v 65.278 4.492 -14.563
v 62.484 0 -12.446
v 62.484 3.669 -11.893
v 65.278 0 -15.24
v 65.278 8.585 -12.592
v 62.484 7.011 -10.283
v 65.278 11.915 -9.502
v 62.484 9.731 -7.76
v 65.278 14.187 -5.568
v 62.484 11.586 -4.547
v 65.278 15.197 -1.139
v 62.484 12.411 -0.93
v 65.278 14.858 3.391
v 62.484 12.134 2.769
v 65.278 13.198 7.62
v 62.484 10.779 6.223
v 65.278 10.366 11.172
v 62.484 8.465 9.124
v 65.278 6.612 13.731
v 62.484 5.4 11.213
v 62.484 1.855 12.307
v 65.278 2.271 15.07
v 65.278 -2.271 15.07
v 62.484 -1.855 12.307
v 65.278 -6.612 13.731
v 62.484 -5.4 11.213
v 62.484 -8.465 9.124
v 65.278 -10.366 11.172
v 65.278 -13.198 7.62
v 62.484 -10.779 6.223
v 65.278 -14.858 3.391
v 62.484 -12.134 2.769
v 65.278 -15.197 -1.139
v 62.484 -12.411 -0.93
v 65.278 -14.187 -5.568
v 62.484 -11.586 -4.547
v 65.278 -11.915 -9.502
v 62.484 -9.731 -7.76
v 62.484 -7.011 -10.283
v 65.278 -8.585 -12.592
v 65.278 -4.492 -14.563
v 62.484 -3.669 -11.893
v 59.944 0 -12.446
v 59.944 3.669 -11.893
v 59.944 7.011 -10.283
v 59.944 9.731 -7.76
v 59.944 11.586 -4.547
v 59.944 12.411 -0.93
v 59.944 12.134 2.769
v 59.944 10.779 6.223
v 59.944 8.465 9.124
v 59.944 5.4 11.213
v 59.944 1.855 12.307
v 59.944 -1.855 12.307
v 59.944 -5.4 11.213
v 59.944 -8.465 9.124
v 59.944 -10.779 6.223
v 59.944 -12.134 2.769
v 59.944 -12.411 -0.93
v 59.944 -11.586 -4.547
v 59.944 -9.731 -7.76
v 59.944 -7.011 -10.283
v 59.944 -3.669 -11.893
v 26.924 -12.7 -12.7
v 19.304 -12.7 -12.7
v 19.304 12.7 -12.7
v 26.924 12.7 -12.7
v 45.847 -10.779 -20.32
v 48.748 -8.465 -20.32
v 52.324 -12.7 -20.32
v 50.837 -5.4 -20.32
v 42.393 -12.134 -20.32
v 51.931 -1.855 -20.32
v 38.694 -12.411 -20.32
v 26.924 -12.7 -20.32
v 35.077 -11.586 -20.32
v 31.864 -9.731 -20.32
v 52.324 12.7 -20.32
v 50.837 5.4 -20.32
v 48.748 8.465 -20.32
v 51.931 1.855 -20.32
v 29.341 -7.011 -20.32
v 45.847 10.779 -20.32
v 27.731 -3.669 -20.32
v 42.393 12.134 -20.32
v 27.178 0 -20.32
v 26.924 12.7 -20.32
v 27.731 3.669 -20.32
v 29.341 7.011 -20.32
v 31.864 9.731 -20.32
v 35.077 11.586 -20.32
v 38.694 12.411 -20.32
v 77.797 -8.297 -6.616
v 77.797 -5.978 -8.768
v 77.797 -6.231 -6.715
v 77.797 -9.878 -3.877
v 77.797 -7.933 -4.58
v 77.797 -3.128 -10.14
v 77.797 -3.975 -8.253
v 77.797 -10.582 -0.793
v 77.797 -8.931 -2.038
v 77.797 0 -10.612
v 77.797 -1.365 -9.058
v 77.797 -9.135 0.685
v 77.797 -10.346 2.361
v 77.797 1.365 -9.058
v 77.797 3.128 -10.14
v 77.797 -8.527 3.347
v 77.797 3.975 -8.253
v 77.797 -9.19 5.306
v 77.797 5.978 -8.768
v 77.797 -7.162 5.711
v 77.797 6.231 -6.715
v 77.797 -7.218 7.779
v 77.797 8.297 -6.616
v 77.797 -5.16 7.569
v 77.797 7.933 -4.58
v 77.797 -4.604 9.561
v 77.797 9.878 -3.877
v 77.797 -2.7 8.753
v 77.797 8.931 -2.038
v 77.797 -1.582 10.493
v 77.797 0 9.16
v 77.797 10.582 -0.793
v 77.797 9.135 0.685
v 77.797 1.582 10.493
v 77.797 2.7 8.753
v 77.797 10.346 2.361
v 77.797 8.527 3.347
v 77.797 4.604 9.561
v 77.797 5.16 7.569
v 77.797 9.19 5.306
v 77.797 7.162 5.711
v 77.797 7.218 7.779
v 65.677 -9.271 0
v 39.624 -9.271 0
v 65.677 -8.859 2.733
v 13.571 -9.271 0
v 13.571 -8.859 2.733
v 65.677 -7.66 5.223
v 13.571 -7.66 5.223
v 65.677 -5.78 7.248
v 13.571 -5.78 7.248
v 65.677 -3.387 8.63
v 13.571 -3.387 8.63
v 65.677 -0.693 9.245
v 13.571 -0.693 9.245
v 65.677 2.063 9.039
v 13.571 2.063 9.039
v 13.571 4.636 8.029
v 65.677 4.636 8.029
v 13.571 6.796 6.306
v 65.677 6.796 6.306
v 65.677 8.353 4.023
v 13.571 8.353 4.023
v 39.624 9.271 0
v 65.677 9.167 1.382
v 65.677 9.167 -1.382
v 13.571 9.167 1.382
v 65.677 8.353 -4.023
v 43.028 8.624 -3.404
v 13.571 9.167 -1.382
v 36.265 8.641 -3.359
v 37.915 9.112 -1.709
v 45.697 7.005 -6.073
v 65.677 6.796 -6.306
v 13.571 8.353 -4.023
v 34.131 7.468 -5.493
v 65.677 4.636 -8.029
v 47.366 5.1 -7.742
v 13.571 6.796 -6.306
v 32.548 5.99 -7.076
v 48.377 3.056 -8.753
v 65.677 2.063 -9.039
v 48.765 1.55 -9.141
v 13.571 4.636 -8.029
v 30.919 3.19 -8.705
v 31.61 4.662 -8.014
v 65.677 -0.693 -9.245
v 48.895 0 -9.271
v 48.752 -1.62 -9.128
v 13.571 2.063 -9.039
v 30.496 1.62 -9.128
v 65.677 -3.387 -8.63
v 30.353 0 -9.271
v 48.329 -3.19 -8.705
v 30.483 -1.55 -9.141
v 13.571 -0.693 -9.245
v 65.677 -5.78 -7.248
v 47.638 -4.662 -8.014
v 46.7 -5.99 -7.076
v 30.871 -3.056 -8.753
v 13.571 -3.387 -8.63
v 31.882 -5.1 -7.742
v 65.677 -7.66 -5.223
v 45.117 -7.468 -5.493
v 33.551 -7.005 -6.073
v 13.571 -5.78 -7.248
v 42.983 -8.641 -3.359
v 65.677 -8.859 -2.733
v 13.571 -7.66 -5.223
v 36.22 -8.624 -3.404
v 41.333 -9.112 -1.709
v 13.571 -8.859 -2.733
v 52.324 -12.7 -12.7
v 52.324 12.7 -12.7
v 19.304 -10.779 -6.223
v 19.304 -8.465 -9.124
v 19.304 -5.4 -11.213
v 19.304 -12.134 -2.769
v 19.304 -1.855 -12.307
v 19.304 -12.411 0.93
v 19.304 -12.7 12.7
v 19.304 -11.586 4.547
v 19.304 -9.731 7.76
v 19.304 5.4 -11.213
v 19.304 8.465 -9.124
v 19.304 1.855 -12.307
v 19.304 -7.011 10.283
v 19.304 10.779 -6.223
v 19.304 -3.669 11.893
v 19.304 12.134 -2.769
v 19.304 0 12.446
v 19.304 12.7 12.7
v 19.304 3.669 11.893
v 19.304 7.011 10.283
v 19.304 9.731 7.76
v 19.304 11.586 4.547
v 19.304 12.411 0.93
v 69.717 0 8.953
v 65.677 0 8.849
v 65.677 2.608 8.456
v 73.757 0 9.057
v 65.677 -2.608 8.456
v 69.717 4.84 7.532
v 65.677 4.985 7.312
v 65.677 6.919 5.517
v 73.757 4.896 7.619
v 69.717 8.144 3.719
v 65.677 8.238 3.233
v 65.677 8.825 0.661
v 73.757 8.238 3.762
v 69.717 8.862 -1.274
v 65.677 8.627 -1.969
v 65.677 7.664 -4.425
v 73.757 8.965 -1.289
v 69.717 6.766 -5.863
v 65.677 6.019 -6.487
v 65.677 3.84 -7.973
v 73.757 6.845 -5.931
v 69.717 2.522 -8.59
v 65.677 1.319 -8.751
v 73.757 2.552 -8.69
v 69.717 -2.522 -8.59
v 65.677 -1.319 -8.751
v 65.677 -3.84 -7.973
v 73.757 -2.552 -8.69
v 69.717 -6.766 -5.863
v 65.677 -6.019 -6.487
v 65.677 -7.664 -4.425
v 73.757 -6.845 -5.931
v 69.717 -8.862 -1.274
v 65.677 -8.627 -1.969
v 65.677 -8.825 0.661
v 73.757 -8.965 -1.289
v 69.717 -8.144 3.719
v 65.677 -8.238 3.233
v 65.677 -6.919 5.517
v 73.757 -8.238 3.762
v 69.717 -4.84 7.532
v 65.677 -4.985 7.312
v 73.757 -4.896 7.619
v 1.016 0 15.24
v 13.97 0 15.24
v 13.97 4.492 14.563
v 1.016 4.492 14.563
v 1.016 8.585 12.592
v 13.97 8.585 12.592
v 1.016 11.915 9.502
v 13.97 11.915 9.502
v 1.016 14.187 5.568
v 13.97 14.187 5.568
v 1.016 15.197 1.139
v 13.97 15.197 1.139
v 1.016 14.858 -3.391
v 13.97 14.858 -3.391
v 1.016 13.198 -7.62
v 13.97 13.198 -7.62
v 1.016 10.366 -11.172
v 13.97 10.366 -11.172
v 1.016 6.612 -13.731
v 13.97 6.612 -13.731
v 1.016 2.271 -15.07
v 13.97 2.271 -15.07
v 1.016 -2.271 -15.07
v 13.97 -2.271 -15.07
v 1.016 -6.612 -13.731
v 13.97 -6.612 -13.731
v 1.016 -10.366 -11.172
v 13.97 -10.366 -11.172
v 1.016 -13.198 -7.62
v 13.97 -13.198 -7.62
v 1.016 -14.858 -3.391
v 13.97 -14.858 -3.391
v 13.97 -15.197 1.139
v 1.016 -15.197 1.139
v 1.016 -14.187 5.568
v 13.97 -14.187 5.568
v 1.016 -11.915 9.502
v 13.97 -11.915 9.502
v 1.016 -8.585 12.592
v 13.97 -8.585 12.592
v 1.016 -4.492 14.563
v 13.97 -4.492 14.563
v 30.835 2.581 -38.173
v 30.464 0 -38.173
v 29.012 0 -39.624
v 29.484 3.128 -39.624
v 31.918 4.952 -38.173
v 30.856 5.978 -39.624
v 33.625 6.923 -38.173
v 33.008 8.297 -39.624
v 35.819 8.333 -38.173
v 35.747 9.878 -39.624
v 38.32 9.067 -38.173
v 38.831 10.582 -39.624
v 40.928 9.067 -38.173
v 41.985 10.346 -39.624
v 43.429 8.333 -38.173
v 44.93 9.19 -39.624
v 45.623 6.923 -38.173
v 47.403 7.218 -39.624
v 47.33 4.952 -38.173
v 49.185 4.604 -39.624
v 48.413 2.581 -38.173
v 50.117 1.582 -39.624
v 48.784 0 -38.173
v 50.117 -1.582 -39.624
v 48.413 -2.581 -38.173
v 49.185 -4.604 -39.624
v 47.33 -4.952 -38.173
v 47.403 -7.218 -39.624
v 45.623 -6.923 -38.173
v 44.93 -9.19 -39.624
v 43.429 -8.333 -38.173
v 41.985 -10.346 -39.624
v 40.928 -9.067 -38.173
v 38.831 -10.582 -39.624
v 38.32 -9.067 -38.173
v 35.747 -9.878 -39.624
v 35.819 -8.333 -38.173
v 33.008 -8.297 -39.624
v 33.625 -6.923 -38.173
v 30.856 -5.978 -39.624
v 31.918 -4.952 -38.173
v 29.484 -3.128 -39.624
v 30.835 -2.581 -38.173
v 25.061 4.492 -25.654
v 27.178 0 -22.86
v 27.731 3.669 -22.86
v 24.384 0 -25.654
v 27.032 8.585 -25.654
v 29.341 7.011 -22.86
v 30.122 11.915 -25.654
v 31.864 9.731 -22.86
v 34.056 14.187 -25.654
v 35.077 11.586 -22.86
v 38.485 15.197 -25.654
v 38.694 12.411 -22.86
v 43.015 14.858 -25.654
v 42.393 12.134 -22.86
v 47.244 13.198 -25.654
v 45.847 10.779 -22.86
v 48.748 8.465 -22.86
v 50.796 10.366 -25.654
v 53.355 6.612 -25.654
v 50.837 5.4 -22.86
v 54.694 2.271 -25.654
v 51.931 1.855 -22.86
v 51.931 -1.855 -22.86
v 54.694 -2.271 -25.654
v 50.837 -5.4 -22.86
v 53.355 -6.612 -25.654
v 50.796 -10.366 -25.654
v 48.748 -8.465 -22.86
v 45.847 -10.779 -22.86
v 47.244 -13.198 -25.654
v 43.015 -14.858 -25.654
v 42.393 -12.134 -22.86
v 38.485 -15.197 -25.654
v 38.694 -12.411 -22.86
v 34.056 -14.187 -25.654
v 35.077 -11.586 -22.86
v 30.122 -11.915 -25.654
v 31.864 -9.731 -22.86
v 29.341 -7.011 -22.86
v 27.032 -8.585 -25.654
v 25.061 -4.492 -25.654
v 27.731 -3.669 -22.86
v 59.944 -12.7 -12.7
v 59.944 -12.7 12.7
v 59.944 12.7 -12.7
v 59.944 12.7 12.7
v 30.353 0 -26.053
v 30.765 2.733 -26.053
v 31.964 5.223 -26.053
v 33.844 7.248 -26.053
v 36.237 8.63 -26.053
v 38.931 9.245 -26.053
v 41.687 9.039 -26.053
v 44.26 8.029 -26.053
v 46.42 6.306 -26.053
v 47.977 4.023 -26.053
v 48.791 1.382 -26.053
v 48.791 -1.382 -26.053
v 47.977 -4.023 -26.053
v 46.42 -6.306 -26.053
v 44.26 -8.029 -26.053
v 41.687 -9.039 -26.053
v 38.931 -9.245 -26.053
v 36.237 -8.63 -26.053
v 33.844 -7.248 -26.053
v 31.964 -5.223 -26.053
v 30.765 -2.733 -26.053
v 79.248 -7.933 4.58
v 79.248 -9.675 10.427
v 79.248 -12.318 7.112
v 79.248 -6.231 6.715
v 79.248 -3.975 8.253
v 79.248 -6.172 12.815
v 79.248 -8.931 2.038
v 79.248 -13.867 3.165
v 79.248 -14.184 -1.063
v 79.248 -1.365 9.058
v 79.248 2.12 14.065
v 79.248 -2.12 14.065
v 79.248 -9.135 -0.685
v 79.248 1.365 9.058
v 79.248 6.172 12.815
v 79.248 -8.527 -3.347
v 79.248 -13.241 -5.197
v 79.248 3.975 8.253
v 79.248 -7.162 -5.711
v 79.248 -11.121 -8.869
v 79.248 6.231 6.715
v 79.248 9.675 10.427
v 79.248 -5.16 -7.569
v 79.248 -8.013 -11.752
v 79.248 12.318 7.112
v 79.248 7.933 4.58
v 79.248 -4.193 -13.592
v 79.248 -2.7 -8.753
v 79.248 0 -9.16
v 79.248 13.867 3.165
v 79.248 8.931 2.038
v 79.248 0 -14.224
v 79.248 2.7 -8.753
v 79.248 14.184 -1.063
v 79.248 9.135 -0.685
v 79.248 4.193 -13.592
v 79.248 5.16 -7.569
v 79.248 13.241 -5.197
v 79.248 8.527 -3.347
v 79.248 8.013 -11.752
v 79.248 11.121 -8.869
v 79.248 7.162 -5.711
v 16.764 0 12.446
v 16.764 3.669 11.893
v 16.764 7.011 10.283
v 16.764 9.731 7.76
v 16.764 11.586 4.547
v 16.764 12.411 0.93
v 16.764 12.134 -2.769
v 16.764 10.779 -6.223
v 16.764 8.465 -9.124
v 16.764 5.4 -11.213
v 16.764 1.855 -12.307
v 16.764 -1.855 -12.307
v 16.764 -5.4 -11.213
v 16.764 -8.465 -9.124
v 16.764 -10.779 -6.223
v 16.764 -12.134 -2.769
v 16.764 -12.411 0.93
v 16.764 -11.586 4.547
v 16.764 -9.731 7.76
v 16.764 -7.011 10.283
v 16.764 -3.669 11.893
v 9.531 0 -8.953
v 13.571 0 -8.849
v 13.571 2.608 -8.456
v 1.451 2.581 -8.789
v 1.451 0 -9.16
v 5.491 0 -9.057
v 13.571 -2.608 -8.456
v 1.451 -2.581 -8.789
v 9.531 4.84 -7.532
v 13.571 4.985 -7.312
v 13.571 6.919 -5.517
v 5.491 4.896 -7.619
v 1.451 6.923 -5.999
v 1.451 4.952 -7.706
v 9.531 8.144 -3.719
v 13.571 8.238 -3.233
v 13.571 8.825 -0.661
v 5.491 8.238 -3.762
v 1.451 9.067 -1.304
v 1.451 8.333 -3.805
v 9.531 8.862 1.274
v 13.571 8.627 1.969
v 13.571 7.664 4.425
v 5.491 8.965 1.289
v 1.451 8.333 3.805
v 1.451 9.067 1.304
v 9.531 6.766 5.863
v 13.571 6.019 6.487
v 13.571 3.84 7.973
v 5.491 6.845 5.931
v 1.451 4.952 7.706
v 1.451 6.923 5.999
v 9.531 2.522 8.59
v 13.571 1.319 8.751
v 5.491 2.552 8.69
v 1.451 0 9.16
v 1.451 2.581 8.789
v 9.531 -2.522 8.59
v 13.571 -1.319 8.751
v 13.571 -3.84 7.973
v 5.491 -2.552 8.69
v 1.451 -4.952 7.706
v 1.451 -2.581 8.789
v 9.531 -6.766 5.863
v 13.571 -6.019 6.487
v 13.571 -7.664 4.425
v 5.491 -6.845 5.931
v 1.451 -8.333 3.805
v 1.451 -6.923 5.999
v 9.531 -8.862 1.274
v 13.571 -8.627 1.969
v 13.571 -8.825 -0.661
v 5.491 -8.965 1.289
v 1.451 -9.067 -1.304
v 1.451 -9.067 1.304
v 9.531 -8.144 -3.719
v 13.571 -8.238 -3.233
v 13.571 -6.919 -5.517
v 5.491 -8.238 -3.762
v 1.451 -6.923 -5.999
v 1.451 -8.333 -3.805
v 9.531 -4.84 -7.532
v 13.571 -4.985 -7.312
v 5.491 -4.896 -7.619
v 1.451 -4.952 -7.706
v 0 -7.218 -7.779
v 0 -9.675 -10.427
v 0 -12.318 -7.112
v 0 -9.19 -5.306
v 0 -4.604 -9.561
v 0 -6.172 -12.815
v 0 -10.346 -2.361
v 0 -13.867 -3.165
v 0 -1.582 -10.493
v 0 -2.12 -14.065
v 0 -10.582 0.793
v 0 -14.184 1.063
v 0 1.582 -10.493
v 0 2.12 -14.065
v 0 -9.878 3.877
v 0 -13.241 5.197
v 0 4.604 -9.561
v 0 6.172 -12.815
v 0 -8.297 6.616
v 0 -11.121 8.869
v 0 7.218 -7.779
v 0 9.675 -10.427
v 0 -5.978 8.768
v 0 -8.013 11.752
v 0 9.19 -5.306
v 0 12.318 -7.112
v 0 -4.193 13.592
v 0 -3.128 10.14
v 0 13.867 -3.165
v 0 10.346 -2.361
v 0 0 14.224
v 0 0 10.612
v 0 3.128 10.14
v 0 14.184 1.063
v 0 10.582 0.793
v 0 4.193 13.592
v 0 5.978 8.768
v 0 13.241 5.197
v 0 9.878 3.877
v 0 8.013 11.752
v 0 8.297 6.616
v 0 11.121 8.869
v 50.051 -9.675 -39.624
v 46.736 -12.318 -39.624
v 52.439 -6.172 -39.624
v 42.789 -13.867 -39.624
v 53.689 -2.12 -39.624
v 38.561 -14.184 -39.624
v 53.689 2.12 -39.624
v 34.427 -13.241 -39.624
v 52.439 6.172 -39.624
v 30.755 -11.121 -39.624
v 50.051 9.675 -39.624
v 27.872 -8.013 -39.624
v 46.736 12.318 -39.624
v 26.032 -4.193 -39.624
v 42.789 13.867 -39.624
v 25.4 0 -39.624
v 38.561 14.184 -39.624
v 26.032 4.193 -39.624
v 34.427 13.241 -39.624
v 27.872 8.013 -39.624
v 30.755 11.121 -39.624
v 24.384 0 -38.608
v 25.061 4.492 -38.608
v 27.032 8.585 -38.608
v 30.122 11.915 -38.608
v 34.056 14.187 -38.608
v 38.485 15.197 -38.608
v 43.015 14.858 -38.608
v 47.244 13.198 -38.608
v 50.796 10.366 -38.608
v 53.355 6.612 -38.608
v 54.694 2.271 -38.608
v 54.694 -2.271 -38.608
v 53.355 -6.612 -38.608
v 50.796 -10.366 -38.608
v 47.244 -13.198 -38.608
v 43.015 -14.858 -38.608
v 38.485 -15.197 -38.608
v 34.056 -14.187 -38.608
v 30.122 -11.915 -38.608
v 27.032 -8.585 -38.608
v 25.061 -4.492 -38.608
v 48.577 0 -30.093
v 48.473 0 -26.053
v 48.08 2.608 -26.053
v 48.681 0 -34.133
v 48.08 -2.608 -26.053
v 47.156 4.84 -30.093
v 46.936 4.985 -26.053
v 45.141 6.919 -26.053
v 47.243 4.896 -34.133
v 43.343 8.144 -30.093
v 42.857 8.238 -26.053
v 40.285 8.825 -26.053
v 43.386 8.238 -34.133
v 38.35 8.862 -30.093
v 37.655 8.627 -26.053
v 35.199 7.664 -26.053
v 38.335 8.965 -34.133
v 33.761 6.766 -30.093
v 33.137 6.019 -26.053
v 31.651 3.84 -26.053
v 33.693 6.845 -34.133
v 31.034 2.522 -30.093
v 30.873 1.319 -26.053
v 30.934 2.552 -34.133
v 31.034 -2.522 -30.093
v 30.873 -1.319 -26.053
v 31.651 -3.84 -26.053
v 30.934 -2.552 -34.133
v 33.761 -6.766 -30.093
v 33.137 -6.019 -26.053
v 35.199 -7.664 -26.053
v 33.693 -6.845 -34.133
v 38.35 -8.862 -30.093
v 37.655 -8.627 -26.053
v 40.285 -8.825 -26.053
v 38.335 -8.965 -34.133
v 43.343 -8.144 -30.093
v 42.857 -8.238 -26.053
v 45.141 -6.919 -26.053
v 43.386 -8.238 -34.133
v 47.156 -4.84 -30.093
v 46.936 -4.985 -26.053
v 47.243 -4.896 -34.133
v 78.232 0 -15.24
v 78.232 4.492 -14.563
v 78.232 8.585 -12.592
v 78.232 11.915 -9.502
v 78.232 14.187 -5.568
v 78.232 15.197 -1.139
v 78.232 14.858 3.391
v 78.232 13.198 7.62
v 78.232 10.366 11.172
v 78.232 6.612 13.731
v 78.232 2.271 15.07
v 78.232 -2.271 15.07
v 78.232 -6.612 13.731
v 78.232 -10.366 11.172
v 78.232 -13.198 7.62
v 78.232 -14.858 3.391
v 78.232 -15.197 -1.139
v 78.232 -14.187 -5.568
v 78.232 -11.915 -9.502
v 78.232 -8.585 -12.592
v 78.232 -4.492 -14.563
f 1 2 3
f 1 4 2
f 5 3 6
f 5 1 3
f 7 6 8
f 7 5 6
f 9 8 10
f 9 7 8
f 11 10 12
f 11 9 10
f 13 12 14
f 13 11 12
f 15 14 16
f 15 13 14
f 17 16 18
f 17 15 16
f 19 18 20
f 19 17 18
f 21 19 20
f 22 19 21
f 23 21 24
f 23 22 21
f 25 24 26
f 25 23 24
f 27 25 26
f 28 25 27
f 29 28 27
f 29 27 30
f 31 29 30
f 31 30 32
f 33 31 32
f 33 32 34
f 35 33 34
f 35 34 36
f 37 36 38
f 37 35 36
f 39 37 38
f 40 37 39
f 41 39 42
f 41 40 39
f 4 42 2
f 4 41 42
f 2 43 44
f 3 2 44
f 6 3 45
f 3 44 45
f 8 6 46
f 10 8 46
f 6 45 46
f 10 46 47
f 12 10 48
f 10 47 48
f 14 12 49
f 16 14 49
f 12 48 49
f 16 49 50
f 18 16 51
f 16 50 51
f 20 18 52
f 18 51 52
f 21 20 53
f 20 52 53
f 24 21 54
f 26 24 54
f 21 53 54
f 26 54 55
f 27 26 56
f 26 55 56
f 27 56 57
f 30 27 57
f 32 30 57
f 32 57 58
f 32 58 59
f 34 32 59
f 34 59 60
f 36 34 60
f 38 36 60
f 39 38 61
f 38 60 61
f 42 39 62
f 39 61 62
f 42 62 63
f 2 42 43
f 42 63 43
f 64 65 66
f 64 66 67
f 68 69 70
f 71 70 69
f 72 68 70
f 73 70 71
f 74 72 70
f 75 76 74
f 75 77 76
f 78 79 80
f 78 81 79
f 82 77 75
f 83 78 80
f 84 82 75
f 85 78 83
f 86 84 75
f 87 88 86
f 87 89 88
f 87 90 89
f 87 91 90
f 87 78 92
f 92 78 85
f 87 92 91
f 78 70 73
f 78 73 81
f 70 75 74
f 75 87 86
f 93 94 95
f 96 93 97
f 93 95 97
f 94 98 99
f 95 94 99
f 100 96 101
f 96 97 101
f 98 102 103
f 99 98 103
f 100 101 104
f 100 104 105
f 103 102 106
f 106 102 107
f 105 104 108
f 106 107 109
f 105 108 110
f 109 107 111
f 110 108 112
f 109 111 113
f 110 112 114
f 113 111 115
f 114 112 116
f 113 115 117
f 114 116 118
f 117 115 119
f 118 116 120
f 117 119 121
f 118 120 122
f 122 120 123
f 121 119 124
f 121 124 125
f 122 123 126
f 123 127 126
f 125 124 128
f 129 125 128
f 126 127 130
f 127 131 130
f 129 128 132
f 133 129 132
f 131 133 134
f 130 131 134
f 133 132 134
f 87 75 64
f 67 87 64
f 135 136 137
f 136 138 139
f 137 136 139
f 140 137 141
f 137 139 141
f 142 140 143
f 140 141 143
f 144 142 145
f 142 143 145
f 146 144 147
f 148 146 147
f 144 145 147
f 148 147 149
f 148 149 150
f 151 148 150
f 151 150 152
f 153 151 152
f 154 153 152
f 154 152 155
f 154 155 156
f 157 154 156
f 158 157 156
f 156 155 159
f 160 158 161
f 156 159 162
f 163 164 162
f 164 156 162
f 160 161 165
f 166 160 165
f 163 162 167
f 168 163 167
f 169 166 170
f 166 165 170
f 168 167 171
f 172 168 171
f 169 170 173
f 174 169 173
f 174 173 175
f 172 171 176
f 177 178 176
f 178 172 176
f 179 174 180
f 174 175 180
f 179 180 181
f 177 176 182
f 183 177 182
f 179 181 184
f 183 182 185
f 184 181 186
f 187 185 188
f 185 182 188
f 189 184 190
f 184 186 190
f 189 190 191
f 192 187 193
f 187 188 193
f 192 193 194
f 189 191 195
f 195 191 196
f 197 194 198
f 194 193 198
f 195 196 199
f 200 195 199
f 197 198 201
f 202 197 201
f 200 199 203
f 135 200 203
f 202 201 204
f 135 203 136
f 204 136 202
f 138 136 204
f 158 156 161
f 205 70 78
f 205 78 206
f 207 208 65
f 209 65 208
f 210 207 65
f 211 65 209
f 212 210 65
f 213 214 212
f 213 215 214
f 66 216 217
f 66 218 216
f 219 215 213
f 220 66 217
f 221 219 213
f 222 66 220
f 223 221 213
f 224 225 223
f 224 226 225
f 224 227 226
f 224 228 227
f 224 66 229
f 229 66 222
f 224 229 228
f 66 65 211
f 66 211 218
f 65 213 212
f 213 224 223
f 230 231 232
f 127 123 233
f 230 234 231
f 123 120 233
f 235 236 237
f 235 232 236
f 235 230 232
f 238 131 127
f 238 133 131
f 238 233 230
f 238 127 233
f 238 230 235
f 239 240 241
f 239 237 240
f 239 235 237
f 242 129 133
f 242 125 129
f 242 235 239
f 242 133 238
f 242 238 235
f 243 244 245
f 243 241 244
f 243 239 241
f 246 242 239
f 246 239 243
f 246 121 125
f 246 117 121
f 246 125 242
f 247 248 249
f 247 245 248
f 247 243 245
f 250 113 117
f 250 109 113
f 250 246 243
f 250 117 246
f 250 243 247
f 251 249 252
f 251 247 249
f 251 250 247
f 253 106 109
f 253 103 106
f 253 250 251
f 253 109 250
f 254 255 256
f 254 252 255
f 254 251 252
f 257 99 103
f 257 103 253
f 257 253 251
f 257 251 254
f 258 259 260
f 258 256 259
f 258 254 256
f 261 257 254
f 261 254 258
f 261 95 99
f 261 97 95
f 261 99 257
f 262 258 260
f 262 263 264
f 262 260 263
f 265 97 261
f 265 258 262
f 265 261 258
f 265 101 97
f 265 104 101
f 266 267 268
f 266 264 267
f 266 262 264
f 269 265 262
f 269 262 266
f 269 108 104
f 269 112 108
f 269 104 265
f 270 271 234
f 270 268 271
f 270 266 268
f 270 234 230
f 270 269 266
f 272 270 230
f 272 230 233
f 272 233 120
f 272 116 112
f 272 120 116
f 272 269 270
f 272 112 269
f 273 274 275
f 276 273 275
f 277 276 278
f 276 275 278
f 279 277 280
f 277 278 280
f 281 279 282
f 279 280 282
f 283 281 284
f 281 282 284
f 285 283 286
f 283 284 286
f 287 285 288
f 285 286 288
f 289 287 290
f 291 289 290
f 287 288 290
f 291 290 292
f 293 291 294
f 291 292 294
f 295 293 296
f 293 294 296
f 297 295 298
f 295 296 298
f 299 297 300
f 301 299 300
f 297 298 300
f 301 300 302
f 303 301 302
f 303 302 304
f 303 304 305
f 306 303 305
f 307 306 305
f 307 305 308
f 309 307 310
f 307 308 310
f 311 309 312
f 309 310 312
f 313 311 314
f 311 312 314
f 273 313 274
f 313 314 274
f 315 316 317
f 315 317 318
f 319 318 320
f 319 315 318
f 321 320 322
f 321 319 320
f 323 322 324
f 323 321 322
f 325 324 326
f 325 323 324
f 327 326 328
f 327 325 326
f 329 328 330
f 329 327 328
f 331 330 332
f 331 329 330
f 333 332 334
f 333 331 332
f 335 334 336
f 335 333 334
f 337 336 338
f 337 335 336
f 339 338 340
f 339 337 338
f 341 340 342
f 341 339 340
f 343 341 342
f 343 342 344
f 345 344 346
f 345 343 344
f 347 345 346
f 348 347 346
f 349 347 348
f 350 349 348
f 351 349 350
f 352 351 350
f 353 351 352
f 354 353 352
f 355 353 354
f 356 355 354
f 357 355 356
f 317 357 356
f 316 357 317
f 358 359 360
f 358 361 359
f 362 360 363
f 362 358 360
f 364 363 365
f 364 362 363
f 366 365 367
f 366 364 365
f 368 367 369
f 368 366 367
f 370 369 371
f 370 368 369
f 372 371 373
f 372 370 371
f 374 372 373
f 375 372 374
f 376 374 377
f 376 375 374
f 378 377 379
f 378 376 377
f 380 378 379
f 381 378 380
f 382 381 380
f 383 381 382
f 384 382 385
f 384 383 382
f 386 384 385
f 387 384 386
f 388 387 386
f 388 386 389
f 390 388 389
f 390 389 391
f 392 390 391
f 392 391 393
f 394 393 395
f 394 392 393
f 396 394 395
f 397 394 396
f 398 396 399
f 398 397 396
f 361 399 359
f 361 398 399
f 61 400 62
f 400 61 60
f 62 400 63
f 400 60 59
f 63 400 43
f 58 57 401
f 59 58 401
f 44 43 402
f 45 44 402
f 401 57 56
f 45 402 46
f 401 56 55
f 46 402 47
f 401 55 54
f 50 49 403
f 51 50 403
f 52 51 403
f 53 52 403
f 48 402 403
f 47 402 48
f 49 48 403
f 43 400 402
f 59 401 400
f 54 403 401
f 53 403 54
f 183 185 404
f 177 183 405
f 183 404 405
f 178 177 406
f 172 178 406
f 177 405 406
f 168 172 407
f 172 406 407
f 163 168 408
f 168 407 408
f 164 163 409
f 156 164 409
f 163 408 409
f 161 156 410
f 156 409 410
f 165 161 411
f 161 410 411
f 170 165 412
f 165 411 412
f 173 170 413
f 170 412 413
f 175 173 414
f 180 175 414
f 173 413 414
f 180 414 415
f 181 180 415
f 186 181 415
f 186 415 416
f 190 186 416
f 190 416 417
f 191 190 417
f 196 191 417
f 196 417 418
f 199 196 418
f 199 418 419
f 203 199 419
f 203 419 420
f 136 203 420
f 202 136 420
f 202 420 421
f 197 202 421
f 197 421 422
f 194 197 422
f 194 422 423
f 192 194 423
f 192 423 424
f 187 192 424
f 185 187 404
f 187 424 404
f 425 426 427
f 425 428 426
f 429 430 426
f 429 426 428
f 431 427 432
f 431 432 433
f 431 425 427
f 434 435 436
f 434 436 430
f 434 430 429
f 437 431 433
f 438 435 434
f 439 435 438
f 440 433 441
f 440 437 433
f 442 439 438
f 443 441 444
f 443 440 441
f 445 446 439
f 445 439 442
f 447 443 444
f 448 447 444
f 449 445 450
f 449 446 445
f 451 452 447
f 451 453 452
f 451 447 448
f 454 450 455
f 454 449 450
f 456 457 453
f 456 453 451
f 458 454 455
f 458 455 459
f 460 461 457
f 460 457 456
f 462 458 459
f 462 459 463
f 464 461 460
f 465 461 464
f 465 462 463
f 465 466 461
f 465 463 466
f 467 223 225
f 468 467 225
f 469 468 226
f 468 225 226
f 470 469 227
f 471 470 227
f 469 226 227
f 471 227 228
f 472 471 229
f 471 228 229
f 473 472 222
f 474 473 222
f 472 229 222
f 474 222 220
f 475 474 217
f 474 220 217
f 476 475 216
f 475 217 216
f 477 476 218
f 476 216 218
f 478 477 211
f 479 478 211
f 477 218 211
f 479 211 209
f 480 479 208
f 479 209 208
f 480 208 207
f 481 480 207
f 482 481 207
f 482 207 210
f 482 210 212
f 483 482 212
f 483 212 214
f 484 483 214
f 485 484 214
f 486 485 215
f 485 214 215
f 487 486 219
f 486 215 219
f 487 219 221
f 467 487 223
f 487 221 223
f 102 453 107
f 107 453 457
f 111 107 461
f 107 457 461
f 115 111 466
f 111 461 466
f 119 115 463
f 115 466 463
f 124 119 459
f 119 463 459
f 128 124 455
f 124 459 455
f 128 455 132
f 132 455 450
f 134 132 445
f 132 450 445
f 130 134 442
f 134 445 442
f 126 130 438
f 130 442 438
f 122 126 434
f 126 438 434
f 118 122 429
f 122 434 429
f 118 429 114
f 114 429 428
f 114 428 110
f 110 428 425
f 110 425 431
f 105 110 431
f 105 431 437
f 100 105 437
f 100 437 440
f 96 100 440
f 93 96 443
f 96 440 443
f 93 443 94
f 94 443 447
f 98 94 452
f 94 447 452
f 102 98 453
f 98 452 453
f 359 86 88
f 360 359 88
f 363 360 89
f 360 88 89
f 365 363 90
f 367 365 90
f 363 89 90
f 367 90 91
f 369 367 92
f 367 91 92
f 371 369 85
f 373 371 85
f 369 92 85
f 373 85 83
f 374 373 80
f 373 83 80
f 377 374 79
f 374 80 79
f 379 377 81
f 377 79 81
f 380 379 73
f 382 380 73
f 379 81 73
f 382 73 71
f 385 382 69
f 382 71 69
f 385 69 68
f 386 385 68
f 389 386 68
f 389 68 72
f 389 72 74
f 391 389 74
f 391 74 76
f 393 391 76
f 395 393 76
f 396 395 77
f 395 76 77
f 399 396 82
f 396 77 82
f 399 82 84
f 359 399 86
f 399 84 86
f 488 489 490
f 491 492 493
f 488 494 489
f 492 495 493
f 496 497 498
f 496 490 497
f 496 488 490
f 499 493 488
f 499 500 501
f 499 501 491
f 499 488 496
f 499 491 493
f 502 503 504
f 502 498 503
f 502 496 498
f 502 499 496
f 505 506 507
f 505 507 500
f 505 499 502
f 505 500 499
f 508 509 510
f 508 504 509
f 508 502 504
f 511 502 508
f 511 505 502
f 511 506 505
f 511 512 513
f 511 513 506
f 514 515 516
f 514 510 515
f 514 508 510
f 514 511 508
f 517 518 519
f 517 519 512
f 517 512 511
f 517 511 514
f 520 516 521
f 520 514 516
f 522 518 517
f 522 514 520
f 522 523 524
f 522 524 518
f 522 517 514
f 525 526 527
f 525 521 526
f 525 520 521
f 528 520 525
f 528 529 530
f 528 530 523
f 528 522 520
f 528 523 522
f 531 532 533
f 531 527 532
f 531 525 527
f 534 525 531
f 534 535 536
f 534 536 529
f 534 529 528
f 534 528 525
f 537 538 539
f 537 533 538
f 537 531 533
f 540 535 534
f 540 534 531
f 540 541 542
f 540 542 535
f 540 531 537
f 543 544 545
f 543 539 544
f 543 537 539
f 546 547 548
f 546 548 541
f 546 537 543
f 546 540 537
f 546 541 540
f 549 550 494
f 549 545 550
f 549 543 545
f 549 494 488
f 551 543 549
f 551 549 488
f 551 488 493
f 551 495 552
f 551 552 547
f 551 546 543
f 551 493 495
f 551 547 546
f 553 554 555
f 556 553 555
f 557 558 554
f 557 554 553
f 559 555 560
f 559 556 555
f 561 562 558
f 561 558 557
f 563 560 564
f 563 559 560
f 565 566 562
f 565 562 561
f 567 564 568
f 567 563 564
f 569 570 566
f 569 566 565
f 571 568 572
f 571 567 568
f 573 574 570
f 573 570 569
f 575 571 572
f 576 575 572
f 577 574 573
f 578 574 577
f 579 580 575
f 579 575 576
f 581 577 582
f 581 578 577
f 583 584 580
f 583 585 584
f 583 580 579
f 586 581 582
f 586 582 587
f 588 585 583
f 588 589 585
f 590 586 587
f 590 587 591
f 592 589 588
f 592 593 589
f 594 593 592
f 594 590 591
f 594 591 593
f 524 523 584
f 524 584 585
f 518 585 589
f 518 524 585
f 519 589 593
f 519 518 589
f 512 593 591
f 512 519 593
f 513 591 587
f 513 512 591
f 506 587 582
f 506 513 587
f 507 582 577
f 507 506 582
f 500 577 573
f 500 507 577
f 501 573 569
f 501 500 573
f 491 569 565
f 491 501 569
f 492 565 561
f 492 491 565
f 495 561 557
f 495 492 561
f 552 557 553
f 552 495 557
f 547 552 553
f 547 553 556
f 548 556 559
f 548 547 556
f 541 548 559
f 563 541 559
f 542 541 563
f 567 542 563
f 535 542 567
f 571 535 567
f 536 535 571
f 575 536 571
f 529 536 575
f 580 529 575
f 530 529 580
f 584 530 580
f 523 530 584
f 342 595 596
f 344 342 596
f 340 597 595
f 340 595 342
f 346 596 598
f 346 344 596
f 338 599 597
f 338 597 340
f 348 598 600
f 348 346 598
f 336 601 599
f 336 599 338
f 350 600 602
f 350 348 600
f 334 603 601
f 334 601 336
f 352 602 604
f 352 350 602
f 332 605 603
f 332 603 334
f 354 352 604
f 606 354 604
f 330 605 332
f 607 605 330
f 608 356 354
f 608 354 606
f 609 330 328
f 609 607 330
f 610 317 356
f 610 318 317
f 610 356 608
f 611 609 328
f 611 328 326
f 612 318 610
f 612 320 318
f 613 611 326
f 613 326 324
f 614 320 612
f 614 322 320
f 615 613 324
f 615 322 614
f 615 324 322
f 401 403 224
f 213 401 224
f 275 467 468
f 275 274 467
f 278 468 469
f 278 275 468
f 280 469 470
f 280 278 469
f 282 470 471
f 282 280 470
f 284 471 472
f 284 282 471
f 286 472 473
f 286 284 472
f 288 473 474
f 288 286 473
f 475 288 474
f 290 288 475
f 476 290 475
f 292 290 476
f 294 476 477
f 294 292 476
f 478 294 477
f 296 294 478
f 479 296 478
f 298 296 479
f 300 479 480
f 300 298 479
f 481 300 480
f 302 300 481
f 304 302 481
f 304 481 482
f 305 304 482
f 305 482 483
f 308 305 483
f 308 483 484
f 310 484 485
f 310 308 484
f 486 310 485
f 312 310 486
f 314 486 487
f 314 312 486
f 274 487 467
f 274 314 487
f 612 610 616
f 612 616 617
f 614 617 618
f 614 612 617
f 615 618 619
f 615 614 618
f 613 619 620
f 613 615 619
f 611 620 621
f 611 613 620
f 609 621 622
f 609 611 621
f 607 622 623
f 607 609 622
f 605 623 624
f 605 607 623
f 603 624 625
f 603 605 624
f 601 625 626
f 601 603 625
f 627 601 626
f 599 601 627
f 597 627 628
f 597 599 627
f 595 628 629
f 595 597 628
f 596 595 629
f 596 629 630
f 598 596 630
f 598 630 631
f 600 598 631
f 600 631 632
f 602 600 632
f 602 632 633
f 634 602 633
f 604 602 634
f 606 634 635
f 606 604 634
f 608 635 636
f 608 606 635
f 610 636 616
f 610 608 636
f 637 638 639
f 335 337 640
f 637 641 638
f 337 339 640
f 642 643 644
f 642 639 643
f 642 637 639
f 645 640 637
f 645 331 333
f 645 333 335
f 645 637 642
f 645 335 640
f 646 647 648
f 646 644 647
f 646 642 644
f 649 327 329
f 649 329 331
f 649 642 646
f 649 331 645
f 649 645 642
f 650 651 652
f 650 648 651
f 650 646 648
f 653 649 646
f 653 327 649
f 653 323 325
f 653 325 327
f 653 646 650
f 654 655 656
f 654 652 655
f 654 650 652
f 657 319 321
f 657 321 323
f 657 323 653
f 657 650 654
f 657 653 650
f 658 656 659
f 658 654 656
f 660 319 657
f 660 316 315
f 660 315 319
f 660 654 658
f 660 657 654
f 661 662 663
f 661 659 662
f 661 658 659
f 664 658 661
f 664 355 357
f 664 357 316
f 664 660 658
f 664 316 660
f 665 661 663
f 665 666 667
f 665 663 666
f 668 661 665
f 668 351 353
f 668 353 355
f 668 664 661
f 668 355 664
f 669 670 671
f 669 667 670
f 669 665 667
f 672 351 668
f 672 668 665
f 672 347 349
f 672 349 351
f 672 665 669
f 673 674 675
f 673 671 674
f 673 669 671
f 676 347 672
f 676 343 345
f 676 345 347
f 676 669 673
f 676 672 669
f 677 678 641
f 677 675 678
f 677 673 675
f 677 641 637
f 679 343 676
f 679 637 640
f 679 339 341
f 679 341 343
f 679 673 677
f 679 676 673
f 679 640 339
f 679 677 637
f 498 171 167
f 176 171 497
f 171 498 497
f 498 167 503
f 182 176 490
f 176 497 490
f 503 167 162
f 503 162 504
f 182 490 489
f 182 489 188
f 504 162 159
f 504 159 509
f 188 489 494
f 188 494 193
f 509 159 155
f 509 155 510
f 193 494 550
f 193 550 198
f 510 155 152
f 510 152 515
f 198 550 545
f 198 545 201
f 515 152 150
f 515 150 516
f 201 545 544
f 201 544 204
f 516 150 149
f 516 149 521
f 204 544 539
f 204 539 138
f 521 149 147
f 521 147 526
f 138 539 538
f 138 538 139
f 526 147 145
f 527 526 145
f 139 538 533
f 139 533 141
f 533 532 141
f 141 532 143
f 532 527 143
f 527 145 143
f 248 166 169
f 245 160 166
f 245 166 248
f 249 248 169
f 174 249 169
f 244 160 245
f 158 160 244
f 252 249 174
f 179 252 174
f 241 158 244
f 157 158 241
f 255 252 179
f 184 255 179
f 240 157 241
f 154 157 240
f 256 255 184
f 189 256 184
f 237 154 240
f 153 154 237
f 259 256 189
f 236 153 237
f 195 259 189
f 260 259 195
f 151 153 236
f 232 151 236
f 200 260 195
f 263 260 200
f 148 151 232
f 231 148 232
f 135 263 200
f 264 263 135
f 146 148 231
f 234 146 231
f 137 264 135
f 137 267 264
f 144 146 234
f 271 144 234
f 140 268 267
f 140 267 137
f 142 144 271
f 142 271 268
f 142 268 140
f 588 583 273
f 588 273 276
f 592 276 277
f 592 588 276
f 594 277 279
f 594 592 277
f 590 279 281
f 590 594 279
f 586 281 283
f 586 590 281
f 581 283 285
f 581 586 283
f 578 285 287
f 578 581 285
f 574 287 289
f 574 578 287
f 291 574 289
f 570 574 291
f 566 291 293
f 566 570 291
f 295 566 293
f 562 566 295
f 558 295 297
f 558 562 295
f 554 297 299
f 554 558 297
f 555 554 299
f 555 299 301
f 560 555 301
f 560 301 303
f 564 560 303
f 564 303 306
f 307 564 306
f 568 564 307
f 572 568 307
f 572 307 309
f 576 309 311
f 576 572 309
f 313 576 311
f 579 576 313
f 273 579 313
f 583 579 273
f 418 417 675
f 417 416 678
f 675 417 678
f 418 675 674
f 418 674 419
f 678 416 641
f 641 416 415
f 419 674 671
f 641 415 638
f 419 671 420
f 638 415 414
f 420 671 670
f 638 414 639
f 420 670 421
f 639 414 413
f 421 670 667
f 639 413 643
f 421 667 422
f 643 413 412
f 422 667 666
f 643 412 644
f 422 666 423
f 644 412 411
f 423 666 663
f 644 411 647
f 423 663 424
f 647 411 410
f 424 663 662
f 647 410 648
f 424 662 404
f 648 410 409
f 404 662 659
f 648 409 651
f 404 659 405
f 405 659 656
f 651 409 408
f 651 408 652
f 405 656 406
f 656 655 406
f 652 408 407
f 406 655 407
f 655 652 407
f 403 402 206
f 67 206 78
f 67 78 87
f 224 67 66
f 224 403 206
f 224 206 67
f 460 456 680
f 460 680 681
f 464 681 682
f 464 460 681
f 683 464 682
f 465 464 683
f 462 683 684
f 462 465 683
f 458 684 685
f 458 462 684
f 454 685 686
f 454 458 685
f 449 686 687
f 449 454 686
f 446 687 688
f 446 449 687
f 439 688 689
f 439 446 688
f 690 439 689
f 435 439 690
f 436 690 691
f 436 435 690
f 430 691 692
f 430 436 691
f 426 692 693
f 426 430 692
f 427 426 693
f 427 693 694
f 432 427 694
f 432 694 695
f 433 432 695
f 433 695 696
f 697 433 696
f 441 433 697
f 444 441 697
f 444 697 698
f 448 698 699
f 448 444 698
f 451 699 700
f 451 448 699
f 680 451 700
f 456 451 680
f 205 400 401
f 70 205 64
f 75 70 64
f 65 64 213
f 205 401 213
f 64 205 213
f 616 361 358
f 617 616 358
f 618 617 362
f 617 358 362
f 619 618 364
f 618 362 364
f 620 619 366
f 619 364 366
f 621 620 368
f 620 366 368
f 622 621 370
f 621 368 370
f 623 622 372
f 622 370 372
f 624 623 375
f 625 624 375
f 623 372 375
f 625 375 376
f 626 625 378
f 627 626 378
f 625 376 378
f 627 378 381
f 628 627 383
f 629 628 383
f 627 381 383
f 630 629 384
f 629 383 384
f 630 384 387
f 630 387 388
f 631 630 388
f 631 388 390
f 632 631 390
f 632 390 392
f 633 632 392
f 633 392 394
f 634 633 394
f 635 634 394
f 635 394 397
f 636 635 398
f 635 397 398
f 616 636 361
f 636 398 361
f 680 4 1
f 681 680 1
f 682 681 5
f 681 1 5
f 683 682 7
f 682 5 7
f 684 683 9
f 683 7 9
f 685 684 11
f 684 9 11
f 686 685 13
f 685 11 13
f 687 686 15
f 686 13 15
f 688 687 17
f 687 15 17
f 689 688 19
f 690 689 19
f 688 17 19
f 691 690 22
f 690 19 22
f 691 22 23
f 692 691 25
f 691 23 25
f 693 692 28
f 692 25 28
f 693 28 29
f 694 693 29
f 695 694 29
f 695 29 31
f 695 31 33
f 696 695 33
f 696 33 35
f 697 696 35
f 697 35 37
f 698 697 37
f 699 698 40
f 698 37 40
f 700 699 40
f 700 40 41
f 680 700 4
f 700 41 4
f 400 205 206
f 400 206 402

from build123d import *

# Parameters (mm, degrees)
SKETCH1_W            = 40.64
SKETCH1_H            = 33.02
BOSS_EXTRUDE1_DEPTH  = 25.4
SKETCH2_W            = 7.62
SKETCH2_H            = 7.62
CUT_EXTRUDE1_DEPTH   = 26.4
SKETCH3_W            = 7.62
SKETCH3_H            = 7.62
CUT_EXTRUDE2_DEPTH   = 26.4
SKETCH4_R            = 12.446
BOSS_EXTRUDE2_DEPTH  = 2.54
SKETCH5_R            = 12.446
BOSS_EXTRUDE3_DEPTH  = 2.794
BOSS_EXTRUDE3_TAPER  = -45
SKETCH6_R            = 15.24
BOSS_EXTRUDE4_DEPTH  = 13.97
SKETCH7_R            = 12.446
BOSS_EXTRUDE5_DEPTH  = 2.54
SKETCH8_R            = 12.446
BOSS_EXTRUDE6_DEPTH  = 2.794
BOSS_EXTRUDE6_TAPER  = -45
SKETCH9_R            = 15.24
BOSS_EXTRUDE7_DEPTH  = 13.97
SKETCH10_R           = 12.446
BOSS_EXTRUDE8_DEPTH  = 2.54
SKETCH11_R           = 12.446
BOSS_EXTRUDE9_DEPTH  = 2.794
BOSS_EXTRUDE9_TAPER  = -45
SKETCH12_R           = 15.24
BOSS_EXTRUDE10_DEPTH = 13.97
SKETCH13_R           = 9.271
CUT_EXTRUDE3_DEPTH   = 52.10556
CUT_EXTRUDE4_REACH   = 43.293
SKETCH14_R           = 9.271
SKETCH15_R           = 10.611739
CUT_EXTRUDE5_DEPTH   = 1.451356
CUT_EXTRUDE5_TAPER   = 45
SKETCH16_R           = 8.849363403
CUT_EXTRUDE6_DEPTH   = 12.119864
CUT_EXTRUDE6_TAPER   = -1.47
SKETCH17_R           = 10.611739
CUT_EXTRUDE7_DEPTH   = 1.451356
CUT_EXTRUDE7_TAPER   = 45
SKETCH18_R           = 8.849363403
CUT_EXTRUDE8_DEPTH   = 12.119864
CUT_EXTRUDE8_TAPER   = -1.47
SKETCH21_R           = 8.849363403
CUT_EXTRUDE9_DEPTH   = 12.119864
CUT_EXTRUDE9_TAPER   = -1.47
CHAMFER1_SIZE        = 1.016
CHAMFER2_SIZE        = 1.016
CHAMFER3_SIZE        = 1.016


with BuildPart() as part:
    # Sketch1 → Boss-Extrude1 (new body)
    with BuildSketch(Plane(origin=(0, 12.7, 0), x_dir=(-1, 0, 0), z_dir=(0, 1, 0))):
        with Locations((-39.624, -3.81)):
            Rectangle(SKETCH1_W, SKETCH1_H)
    extrude(amount=-BOSS_EXTRUDE1_DEPTH)

    # Sketch2 → Cut-Extrude1 (cut, through all)
    with BuildSketch(Plane.XZ.offset(12.7)):
        with Locations((56.134, -16.51)):
            Rectangle(SKETCH2_W, SKETCH2_H)
    extrude(amount=-CUT_EXTRUDE1_DEPTH, mode=Mode.SUBTRACT)

    # Sketch3 → Cut-Extrude2 (cut, through all)
    with BuildSketch(Plane.XZ.offset(12.7)):
        with Locations((23.114, -16.51)):
            Rectangle(SKETCH3_W, SKETCH3_H)
    extrude(amount=-CUT_EXTRUDE2_DEPTH, mode=Mode.SUBTRACT)

    # Sketch4 → Boss-Extrude2 (add)
    with BuildSketch(Plane.ZY.offset(-19.304)):
        Circle(SKETCH4_R)
    extrude(amount=BOSS_EXTRUDE2_DEPTH)

    # Sketch5 → Boss-Extrude3 (add)
    with BuildSketch(Plane.ZY.offset(-16.764)):
        Circle(SKETCH5_R)
    extrude(amount=BOSS_EXTRUDE3_DEPTH, taper=BOSS_EXTRUDE3_TAPER)

    # Sketch6 → Boss-Extrude4 (add)
    with BuildSketch(Plane.ZY.offset(-13.97)):
        Circle(SKETCH6_R)
    extrude(amount=BOSS_EXTRUDE4_DEPTH)

    # Sketch7 → Boss-Extrude5 (add)
    with BuildSketch(Plane(origin=(59.944, 0, 0), x_dir=(0, 0, -1), z_dir=(1, 0, 0))):
        Circle(SKETCH7_R)
    extrude(amount=BOSS_EXTRUDE5_DEPTH)

    # Sketch8 → Boss-Extrude6 (add)
    with BuildSketch(Plane(origin=(62.484, 0, 0), x_dir=(0, 0, -1), z_dir=(1, 0, 0))):
        Circle(SKETCH8_R)
    extrude(amount=BOSS_EXTRUDE6_DEPTH, taper=BOSS_EXTRUDE6_TAPER)

    # Sketch9 → Boss-Extrude7 (add)
    with BuildSketch(Plane(origin=(65.278, 0, 0), x_dir=(0, 0, -1), z_dir=(1, 0, 0))):
        Circle(SKETCH9_R)
    extrude(amount=BOSS_EXTRUDE7_DEPTH)

    # Sketch10 → Boss-Extrude8 (add)
    with BuildSketch(Plane(origin=(0, 0, -20.32), x_dir=(-1, 0, 0), z_dir=(0, 0, -1))):
        with Locations((-39.624, 0)):
            Circle(SKETCH10_R)
    extrude(amount=BOSS_EXTRUDE8_DEPTH)

    # Sketch11 → Boss-Extrude9 (add)
    with BuildSketch(Plane(origin=(0, 0, -22.86), x_dir=(-1, 0, 0), z_dir=(0, 0, -1))):
        with Locations((-39.624, 0)):
            Circle(SKETCH11_R)
    extrude(amount=BOSS_EXTRUDE9_DEPTH, taper=BOSS_EXTRUDE9_TAPER)

    # Sketch12 → Boss-Extrude10 (add)
    with BuildSketch(Plane(origin=(0, 0, -25.654), x_dir=(-1, 0, 0), z_dir=(0, 0, -1))):
        with Locations((-39.624, 0)):
            Circle(SKETCH12_R)
    extrude(amount=BOSS_EXTRUDE10_DEPTH)

    # Sketch13 → Cut-Extrude3 (cut)
    with BuildSketch(Plane(origin=(13.57122, 0, 0), x_dir=(0, -1, 0), z_dir=(-1, 0, 0))):
        Circle(SKETCH13_R)
    extrude(amount=-CUT_EXTRUDE3_DEPTH, mode=Mode.SUBTRACT)

    # Sketch14 → Cut-Extrude4 (cut, up to next)
    with BuildSketch(Plane(origin=(0, 0, -26.05278), x_dir=(-1, 0, 0), z_dir=(0, 0, -1)), mode=Mode.PRIVATE) as cut_extrude4_sk1:
        with Locations((-39.624, 0)):
            Circle(SKETCH14_R)
    cut_extrude4_tool1 = extrude(cut_extrude4_sk1.sketch, amount=-CUT_EXTRUDE4_REACH, mode=Mode.PRIVATE) & part.part
    add(cut_extrude4_tool1.solids().sort_by_distance((39.624, 0, -26.05278))[0], mode=Mode.SUBTRACT)

    # Sketch15 → Cut-Extrude5 (cut)
    with BuildSketch(Plane(origin=(0, 0, -39.624), x_dir=(-1, 0, 0), z_dir=(0, 0, -1))):
        with Locations((-39.624, 0)):
            Circle(SKETCH15_R)
    extrude(amount=-CUT_EXTRUDE5_DEPTH, taper=CUT_EXTRUDE5_TAPER, mode=Mode.SUBTRACT)

    # Sketch16 → Cut-Extrude6 (cut)
    with BuildSketch(Plane.XY.offset(-26.05278)):
        with Locations((39.624, 0)):
            Circle(SKETCH16_R)
    extrude(amount=-CUT_EXTRUDE6_DEPTH, taper=CUT_EXTRUDE6_TAPER, mode=Mode.SUBTRACT)

    # Sketch17 → Cut-Extrude7 (cut)
    with BuildSketch(Plane.ZY):
        Circle(SKETCH17_R)
    extrude(amount=-CUT_EXTRUDE7_DEPTH, taper=CUT_EXTRUDE7_TAPER, mode=Mode.SUBTRACT)

    # Sketch18 → Cut-Extrude8 (cut)
    with BuildSketch(Plane(origin=(13.57122, 0, 0), x_dir=(0, 0, -1), z_dir=(1, 0, 0))):
        Circle(SKETCH18_R)
    extrude(amount=-CUT_EXTRUDE8_DEPTH, taper=CUT_EXTRUDE8_TAPER, mode=Mode.SUBTRACT)

    # Sketch19 → Hole1 (revolve, cut)
    with BuildSketch(Plane(origin=(79.248, 0, 0), x_dir=(0, 0, -1), z_dir=(0, 1, 0))):
        Polygon((0, 0), (0, 1.451356), (10.611739, 1.451356), (9.160383, 0), align=None)
    revolve(axis=Axis((-30.752, 0, 0), (1, 0, 0)), mode=Mode.SUBTRACT)

    # Sketch21 → Cut-Extrude9 (cut)
    with BuildSketch(Plane.ZY.offset(-65.67678)):
        Circle(SKETCH21_R)
    extrude(amount=-CUT_EXTRUDE9_DEPTH, taper=CUT_EXTRUDE9_TAPER, mode=Mode.SUBTRACT)

    # Chamfer1
    chamfer1_edges = [part.edges().sort_by_distance(p)[0] for p in [
        (0, 0, -15.24),
    ]]
    chamfer(chamfer1_edges, length=CHAMFER1_SIZE)

    # Chamfer2
    chamfer2_edges = [part.edges().sort_by_distance(p)[0] for p in [
        (79.248, 0, 15.24),
    ]]
    chamfer(chamfer2_edges, length=CHAMFER2_SIZE)

    # Chamfer3
    chamfer3_edges = [part.edges().sort_by_distance(p)[0] for p in [
        (54.864, 0, -39.624),
    ]]
    chamfer(chamfer3_edges, length=CHAMFER3_SIZE)


solid = part.part
